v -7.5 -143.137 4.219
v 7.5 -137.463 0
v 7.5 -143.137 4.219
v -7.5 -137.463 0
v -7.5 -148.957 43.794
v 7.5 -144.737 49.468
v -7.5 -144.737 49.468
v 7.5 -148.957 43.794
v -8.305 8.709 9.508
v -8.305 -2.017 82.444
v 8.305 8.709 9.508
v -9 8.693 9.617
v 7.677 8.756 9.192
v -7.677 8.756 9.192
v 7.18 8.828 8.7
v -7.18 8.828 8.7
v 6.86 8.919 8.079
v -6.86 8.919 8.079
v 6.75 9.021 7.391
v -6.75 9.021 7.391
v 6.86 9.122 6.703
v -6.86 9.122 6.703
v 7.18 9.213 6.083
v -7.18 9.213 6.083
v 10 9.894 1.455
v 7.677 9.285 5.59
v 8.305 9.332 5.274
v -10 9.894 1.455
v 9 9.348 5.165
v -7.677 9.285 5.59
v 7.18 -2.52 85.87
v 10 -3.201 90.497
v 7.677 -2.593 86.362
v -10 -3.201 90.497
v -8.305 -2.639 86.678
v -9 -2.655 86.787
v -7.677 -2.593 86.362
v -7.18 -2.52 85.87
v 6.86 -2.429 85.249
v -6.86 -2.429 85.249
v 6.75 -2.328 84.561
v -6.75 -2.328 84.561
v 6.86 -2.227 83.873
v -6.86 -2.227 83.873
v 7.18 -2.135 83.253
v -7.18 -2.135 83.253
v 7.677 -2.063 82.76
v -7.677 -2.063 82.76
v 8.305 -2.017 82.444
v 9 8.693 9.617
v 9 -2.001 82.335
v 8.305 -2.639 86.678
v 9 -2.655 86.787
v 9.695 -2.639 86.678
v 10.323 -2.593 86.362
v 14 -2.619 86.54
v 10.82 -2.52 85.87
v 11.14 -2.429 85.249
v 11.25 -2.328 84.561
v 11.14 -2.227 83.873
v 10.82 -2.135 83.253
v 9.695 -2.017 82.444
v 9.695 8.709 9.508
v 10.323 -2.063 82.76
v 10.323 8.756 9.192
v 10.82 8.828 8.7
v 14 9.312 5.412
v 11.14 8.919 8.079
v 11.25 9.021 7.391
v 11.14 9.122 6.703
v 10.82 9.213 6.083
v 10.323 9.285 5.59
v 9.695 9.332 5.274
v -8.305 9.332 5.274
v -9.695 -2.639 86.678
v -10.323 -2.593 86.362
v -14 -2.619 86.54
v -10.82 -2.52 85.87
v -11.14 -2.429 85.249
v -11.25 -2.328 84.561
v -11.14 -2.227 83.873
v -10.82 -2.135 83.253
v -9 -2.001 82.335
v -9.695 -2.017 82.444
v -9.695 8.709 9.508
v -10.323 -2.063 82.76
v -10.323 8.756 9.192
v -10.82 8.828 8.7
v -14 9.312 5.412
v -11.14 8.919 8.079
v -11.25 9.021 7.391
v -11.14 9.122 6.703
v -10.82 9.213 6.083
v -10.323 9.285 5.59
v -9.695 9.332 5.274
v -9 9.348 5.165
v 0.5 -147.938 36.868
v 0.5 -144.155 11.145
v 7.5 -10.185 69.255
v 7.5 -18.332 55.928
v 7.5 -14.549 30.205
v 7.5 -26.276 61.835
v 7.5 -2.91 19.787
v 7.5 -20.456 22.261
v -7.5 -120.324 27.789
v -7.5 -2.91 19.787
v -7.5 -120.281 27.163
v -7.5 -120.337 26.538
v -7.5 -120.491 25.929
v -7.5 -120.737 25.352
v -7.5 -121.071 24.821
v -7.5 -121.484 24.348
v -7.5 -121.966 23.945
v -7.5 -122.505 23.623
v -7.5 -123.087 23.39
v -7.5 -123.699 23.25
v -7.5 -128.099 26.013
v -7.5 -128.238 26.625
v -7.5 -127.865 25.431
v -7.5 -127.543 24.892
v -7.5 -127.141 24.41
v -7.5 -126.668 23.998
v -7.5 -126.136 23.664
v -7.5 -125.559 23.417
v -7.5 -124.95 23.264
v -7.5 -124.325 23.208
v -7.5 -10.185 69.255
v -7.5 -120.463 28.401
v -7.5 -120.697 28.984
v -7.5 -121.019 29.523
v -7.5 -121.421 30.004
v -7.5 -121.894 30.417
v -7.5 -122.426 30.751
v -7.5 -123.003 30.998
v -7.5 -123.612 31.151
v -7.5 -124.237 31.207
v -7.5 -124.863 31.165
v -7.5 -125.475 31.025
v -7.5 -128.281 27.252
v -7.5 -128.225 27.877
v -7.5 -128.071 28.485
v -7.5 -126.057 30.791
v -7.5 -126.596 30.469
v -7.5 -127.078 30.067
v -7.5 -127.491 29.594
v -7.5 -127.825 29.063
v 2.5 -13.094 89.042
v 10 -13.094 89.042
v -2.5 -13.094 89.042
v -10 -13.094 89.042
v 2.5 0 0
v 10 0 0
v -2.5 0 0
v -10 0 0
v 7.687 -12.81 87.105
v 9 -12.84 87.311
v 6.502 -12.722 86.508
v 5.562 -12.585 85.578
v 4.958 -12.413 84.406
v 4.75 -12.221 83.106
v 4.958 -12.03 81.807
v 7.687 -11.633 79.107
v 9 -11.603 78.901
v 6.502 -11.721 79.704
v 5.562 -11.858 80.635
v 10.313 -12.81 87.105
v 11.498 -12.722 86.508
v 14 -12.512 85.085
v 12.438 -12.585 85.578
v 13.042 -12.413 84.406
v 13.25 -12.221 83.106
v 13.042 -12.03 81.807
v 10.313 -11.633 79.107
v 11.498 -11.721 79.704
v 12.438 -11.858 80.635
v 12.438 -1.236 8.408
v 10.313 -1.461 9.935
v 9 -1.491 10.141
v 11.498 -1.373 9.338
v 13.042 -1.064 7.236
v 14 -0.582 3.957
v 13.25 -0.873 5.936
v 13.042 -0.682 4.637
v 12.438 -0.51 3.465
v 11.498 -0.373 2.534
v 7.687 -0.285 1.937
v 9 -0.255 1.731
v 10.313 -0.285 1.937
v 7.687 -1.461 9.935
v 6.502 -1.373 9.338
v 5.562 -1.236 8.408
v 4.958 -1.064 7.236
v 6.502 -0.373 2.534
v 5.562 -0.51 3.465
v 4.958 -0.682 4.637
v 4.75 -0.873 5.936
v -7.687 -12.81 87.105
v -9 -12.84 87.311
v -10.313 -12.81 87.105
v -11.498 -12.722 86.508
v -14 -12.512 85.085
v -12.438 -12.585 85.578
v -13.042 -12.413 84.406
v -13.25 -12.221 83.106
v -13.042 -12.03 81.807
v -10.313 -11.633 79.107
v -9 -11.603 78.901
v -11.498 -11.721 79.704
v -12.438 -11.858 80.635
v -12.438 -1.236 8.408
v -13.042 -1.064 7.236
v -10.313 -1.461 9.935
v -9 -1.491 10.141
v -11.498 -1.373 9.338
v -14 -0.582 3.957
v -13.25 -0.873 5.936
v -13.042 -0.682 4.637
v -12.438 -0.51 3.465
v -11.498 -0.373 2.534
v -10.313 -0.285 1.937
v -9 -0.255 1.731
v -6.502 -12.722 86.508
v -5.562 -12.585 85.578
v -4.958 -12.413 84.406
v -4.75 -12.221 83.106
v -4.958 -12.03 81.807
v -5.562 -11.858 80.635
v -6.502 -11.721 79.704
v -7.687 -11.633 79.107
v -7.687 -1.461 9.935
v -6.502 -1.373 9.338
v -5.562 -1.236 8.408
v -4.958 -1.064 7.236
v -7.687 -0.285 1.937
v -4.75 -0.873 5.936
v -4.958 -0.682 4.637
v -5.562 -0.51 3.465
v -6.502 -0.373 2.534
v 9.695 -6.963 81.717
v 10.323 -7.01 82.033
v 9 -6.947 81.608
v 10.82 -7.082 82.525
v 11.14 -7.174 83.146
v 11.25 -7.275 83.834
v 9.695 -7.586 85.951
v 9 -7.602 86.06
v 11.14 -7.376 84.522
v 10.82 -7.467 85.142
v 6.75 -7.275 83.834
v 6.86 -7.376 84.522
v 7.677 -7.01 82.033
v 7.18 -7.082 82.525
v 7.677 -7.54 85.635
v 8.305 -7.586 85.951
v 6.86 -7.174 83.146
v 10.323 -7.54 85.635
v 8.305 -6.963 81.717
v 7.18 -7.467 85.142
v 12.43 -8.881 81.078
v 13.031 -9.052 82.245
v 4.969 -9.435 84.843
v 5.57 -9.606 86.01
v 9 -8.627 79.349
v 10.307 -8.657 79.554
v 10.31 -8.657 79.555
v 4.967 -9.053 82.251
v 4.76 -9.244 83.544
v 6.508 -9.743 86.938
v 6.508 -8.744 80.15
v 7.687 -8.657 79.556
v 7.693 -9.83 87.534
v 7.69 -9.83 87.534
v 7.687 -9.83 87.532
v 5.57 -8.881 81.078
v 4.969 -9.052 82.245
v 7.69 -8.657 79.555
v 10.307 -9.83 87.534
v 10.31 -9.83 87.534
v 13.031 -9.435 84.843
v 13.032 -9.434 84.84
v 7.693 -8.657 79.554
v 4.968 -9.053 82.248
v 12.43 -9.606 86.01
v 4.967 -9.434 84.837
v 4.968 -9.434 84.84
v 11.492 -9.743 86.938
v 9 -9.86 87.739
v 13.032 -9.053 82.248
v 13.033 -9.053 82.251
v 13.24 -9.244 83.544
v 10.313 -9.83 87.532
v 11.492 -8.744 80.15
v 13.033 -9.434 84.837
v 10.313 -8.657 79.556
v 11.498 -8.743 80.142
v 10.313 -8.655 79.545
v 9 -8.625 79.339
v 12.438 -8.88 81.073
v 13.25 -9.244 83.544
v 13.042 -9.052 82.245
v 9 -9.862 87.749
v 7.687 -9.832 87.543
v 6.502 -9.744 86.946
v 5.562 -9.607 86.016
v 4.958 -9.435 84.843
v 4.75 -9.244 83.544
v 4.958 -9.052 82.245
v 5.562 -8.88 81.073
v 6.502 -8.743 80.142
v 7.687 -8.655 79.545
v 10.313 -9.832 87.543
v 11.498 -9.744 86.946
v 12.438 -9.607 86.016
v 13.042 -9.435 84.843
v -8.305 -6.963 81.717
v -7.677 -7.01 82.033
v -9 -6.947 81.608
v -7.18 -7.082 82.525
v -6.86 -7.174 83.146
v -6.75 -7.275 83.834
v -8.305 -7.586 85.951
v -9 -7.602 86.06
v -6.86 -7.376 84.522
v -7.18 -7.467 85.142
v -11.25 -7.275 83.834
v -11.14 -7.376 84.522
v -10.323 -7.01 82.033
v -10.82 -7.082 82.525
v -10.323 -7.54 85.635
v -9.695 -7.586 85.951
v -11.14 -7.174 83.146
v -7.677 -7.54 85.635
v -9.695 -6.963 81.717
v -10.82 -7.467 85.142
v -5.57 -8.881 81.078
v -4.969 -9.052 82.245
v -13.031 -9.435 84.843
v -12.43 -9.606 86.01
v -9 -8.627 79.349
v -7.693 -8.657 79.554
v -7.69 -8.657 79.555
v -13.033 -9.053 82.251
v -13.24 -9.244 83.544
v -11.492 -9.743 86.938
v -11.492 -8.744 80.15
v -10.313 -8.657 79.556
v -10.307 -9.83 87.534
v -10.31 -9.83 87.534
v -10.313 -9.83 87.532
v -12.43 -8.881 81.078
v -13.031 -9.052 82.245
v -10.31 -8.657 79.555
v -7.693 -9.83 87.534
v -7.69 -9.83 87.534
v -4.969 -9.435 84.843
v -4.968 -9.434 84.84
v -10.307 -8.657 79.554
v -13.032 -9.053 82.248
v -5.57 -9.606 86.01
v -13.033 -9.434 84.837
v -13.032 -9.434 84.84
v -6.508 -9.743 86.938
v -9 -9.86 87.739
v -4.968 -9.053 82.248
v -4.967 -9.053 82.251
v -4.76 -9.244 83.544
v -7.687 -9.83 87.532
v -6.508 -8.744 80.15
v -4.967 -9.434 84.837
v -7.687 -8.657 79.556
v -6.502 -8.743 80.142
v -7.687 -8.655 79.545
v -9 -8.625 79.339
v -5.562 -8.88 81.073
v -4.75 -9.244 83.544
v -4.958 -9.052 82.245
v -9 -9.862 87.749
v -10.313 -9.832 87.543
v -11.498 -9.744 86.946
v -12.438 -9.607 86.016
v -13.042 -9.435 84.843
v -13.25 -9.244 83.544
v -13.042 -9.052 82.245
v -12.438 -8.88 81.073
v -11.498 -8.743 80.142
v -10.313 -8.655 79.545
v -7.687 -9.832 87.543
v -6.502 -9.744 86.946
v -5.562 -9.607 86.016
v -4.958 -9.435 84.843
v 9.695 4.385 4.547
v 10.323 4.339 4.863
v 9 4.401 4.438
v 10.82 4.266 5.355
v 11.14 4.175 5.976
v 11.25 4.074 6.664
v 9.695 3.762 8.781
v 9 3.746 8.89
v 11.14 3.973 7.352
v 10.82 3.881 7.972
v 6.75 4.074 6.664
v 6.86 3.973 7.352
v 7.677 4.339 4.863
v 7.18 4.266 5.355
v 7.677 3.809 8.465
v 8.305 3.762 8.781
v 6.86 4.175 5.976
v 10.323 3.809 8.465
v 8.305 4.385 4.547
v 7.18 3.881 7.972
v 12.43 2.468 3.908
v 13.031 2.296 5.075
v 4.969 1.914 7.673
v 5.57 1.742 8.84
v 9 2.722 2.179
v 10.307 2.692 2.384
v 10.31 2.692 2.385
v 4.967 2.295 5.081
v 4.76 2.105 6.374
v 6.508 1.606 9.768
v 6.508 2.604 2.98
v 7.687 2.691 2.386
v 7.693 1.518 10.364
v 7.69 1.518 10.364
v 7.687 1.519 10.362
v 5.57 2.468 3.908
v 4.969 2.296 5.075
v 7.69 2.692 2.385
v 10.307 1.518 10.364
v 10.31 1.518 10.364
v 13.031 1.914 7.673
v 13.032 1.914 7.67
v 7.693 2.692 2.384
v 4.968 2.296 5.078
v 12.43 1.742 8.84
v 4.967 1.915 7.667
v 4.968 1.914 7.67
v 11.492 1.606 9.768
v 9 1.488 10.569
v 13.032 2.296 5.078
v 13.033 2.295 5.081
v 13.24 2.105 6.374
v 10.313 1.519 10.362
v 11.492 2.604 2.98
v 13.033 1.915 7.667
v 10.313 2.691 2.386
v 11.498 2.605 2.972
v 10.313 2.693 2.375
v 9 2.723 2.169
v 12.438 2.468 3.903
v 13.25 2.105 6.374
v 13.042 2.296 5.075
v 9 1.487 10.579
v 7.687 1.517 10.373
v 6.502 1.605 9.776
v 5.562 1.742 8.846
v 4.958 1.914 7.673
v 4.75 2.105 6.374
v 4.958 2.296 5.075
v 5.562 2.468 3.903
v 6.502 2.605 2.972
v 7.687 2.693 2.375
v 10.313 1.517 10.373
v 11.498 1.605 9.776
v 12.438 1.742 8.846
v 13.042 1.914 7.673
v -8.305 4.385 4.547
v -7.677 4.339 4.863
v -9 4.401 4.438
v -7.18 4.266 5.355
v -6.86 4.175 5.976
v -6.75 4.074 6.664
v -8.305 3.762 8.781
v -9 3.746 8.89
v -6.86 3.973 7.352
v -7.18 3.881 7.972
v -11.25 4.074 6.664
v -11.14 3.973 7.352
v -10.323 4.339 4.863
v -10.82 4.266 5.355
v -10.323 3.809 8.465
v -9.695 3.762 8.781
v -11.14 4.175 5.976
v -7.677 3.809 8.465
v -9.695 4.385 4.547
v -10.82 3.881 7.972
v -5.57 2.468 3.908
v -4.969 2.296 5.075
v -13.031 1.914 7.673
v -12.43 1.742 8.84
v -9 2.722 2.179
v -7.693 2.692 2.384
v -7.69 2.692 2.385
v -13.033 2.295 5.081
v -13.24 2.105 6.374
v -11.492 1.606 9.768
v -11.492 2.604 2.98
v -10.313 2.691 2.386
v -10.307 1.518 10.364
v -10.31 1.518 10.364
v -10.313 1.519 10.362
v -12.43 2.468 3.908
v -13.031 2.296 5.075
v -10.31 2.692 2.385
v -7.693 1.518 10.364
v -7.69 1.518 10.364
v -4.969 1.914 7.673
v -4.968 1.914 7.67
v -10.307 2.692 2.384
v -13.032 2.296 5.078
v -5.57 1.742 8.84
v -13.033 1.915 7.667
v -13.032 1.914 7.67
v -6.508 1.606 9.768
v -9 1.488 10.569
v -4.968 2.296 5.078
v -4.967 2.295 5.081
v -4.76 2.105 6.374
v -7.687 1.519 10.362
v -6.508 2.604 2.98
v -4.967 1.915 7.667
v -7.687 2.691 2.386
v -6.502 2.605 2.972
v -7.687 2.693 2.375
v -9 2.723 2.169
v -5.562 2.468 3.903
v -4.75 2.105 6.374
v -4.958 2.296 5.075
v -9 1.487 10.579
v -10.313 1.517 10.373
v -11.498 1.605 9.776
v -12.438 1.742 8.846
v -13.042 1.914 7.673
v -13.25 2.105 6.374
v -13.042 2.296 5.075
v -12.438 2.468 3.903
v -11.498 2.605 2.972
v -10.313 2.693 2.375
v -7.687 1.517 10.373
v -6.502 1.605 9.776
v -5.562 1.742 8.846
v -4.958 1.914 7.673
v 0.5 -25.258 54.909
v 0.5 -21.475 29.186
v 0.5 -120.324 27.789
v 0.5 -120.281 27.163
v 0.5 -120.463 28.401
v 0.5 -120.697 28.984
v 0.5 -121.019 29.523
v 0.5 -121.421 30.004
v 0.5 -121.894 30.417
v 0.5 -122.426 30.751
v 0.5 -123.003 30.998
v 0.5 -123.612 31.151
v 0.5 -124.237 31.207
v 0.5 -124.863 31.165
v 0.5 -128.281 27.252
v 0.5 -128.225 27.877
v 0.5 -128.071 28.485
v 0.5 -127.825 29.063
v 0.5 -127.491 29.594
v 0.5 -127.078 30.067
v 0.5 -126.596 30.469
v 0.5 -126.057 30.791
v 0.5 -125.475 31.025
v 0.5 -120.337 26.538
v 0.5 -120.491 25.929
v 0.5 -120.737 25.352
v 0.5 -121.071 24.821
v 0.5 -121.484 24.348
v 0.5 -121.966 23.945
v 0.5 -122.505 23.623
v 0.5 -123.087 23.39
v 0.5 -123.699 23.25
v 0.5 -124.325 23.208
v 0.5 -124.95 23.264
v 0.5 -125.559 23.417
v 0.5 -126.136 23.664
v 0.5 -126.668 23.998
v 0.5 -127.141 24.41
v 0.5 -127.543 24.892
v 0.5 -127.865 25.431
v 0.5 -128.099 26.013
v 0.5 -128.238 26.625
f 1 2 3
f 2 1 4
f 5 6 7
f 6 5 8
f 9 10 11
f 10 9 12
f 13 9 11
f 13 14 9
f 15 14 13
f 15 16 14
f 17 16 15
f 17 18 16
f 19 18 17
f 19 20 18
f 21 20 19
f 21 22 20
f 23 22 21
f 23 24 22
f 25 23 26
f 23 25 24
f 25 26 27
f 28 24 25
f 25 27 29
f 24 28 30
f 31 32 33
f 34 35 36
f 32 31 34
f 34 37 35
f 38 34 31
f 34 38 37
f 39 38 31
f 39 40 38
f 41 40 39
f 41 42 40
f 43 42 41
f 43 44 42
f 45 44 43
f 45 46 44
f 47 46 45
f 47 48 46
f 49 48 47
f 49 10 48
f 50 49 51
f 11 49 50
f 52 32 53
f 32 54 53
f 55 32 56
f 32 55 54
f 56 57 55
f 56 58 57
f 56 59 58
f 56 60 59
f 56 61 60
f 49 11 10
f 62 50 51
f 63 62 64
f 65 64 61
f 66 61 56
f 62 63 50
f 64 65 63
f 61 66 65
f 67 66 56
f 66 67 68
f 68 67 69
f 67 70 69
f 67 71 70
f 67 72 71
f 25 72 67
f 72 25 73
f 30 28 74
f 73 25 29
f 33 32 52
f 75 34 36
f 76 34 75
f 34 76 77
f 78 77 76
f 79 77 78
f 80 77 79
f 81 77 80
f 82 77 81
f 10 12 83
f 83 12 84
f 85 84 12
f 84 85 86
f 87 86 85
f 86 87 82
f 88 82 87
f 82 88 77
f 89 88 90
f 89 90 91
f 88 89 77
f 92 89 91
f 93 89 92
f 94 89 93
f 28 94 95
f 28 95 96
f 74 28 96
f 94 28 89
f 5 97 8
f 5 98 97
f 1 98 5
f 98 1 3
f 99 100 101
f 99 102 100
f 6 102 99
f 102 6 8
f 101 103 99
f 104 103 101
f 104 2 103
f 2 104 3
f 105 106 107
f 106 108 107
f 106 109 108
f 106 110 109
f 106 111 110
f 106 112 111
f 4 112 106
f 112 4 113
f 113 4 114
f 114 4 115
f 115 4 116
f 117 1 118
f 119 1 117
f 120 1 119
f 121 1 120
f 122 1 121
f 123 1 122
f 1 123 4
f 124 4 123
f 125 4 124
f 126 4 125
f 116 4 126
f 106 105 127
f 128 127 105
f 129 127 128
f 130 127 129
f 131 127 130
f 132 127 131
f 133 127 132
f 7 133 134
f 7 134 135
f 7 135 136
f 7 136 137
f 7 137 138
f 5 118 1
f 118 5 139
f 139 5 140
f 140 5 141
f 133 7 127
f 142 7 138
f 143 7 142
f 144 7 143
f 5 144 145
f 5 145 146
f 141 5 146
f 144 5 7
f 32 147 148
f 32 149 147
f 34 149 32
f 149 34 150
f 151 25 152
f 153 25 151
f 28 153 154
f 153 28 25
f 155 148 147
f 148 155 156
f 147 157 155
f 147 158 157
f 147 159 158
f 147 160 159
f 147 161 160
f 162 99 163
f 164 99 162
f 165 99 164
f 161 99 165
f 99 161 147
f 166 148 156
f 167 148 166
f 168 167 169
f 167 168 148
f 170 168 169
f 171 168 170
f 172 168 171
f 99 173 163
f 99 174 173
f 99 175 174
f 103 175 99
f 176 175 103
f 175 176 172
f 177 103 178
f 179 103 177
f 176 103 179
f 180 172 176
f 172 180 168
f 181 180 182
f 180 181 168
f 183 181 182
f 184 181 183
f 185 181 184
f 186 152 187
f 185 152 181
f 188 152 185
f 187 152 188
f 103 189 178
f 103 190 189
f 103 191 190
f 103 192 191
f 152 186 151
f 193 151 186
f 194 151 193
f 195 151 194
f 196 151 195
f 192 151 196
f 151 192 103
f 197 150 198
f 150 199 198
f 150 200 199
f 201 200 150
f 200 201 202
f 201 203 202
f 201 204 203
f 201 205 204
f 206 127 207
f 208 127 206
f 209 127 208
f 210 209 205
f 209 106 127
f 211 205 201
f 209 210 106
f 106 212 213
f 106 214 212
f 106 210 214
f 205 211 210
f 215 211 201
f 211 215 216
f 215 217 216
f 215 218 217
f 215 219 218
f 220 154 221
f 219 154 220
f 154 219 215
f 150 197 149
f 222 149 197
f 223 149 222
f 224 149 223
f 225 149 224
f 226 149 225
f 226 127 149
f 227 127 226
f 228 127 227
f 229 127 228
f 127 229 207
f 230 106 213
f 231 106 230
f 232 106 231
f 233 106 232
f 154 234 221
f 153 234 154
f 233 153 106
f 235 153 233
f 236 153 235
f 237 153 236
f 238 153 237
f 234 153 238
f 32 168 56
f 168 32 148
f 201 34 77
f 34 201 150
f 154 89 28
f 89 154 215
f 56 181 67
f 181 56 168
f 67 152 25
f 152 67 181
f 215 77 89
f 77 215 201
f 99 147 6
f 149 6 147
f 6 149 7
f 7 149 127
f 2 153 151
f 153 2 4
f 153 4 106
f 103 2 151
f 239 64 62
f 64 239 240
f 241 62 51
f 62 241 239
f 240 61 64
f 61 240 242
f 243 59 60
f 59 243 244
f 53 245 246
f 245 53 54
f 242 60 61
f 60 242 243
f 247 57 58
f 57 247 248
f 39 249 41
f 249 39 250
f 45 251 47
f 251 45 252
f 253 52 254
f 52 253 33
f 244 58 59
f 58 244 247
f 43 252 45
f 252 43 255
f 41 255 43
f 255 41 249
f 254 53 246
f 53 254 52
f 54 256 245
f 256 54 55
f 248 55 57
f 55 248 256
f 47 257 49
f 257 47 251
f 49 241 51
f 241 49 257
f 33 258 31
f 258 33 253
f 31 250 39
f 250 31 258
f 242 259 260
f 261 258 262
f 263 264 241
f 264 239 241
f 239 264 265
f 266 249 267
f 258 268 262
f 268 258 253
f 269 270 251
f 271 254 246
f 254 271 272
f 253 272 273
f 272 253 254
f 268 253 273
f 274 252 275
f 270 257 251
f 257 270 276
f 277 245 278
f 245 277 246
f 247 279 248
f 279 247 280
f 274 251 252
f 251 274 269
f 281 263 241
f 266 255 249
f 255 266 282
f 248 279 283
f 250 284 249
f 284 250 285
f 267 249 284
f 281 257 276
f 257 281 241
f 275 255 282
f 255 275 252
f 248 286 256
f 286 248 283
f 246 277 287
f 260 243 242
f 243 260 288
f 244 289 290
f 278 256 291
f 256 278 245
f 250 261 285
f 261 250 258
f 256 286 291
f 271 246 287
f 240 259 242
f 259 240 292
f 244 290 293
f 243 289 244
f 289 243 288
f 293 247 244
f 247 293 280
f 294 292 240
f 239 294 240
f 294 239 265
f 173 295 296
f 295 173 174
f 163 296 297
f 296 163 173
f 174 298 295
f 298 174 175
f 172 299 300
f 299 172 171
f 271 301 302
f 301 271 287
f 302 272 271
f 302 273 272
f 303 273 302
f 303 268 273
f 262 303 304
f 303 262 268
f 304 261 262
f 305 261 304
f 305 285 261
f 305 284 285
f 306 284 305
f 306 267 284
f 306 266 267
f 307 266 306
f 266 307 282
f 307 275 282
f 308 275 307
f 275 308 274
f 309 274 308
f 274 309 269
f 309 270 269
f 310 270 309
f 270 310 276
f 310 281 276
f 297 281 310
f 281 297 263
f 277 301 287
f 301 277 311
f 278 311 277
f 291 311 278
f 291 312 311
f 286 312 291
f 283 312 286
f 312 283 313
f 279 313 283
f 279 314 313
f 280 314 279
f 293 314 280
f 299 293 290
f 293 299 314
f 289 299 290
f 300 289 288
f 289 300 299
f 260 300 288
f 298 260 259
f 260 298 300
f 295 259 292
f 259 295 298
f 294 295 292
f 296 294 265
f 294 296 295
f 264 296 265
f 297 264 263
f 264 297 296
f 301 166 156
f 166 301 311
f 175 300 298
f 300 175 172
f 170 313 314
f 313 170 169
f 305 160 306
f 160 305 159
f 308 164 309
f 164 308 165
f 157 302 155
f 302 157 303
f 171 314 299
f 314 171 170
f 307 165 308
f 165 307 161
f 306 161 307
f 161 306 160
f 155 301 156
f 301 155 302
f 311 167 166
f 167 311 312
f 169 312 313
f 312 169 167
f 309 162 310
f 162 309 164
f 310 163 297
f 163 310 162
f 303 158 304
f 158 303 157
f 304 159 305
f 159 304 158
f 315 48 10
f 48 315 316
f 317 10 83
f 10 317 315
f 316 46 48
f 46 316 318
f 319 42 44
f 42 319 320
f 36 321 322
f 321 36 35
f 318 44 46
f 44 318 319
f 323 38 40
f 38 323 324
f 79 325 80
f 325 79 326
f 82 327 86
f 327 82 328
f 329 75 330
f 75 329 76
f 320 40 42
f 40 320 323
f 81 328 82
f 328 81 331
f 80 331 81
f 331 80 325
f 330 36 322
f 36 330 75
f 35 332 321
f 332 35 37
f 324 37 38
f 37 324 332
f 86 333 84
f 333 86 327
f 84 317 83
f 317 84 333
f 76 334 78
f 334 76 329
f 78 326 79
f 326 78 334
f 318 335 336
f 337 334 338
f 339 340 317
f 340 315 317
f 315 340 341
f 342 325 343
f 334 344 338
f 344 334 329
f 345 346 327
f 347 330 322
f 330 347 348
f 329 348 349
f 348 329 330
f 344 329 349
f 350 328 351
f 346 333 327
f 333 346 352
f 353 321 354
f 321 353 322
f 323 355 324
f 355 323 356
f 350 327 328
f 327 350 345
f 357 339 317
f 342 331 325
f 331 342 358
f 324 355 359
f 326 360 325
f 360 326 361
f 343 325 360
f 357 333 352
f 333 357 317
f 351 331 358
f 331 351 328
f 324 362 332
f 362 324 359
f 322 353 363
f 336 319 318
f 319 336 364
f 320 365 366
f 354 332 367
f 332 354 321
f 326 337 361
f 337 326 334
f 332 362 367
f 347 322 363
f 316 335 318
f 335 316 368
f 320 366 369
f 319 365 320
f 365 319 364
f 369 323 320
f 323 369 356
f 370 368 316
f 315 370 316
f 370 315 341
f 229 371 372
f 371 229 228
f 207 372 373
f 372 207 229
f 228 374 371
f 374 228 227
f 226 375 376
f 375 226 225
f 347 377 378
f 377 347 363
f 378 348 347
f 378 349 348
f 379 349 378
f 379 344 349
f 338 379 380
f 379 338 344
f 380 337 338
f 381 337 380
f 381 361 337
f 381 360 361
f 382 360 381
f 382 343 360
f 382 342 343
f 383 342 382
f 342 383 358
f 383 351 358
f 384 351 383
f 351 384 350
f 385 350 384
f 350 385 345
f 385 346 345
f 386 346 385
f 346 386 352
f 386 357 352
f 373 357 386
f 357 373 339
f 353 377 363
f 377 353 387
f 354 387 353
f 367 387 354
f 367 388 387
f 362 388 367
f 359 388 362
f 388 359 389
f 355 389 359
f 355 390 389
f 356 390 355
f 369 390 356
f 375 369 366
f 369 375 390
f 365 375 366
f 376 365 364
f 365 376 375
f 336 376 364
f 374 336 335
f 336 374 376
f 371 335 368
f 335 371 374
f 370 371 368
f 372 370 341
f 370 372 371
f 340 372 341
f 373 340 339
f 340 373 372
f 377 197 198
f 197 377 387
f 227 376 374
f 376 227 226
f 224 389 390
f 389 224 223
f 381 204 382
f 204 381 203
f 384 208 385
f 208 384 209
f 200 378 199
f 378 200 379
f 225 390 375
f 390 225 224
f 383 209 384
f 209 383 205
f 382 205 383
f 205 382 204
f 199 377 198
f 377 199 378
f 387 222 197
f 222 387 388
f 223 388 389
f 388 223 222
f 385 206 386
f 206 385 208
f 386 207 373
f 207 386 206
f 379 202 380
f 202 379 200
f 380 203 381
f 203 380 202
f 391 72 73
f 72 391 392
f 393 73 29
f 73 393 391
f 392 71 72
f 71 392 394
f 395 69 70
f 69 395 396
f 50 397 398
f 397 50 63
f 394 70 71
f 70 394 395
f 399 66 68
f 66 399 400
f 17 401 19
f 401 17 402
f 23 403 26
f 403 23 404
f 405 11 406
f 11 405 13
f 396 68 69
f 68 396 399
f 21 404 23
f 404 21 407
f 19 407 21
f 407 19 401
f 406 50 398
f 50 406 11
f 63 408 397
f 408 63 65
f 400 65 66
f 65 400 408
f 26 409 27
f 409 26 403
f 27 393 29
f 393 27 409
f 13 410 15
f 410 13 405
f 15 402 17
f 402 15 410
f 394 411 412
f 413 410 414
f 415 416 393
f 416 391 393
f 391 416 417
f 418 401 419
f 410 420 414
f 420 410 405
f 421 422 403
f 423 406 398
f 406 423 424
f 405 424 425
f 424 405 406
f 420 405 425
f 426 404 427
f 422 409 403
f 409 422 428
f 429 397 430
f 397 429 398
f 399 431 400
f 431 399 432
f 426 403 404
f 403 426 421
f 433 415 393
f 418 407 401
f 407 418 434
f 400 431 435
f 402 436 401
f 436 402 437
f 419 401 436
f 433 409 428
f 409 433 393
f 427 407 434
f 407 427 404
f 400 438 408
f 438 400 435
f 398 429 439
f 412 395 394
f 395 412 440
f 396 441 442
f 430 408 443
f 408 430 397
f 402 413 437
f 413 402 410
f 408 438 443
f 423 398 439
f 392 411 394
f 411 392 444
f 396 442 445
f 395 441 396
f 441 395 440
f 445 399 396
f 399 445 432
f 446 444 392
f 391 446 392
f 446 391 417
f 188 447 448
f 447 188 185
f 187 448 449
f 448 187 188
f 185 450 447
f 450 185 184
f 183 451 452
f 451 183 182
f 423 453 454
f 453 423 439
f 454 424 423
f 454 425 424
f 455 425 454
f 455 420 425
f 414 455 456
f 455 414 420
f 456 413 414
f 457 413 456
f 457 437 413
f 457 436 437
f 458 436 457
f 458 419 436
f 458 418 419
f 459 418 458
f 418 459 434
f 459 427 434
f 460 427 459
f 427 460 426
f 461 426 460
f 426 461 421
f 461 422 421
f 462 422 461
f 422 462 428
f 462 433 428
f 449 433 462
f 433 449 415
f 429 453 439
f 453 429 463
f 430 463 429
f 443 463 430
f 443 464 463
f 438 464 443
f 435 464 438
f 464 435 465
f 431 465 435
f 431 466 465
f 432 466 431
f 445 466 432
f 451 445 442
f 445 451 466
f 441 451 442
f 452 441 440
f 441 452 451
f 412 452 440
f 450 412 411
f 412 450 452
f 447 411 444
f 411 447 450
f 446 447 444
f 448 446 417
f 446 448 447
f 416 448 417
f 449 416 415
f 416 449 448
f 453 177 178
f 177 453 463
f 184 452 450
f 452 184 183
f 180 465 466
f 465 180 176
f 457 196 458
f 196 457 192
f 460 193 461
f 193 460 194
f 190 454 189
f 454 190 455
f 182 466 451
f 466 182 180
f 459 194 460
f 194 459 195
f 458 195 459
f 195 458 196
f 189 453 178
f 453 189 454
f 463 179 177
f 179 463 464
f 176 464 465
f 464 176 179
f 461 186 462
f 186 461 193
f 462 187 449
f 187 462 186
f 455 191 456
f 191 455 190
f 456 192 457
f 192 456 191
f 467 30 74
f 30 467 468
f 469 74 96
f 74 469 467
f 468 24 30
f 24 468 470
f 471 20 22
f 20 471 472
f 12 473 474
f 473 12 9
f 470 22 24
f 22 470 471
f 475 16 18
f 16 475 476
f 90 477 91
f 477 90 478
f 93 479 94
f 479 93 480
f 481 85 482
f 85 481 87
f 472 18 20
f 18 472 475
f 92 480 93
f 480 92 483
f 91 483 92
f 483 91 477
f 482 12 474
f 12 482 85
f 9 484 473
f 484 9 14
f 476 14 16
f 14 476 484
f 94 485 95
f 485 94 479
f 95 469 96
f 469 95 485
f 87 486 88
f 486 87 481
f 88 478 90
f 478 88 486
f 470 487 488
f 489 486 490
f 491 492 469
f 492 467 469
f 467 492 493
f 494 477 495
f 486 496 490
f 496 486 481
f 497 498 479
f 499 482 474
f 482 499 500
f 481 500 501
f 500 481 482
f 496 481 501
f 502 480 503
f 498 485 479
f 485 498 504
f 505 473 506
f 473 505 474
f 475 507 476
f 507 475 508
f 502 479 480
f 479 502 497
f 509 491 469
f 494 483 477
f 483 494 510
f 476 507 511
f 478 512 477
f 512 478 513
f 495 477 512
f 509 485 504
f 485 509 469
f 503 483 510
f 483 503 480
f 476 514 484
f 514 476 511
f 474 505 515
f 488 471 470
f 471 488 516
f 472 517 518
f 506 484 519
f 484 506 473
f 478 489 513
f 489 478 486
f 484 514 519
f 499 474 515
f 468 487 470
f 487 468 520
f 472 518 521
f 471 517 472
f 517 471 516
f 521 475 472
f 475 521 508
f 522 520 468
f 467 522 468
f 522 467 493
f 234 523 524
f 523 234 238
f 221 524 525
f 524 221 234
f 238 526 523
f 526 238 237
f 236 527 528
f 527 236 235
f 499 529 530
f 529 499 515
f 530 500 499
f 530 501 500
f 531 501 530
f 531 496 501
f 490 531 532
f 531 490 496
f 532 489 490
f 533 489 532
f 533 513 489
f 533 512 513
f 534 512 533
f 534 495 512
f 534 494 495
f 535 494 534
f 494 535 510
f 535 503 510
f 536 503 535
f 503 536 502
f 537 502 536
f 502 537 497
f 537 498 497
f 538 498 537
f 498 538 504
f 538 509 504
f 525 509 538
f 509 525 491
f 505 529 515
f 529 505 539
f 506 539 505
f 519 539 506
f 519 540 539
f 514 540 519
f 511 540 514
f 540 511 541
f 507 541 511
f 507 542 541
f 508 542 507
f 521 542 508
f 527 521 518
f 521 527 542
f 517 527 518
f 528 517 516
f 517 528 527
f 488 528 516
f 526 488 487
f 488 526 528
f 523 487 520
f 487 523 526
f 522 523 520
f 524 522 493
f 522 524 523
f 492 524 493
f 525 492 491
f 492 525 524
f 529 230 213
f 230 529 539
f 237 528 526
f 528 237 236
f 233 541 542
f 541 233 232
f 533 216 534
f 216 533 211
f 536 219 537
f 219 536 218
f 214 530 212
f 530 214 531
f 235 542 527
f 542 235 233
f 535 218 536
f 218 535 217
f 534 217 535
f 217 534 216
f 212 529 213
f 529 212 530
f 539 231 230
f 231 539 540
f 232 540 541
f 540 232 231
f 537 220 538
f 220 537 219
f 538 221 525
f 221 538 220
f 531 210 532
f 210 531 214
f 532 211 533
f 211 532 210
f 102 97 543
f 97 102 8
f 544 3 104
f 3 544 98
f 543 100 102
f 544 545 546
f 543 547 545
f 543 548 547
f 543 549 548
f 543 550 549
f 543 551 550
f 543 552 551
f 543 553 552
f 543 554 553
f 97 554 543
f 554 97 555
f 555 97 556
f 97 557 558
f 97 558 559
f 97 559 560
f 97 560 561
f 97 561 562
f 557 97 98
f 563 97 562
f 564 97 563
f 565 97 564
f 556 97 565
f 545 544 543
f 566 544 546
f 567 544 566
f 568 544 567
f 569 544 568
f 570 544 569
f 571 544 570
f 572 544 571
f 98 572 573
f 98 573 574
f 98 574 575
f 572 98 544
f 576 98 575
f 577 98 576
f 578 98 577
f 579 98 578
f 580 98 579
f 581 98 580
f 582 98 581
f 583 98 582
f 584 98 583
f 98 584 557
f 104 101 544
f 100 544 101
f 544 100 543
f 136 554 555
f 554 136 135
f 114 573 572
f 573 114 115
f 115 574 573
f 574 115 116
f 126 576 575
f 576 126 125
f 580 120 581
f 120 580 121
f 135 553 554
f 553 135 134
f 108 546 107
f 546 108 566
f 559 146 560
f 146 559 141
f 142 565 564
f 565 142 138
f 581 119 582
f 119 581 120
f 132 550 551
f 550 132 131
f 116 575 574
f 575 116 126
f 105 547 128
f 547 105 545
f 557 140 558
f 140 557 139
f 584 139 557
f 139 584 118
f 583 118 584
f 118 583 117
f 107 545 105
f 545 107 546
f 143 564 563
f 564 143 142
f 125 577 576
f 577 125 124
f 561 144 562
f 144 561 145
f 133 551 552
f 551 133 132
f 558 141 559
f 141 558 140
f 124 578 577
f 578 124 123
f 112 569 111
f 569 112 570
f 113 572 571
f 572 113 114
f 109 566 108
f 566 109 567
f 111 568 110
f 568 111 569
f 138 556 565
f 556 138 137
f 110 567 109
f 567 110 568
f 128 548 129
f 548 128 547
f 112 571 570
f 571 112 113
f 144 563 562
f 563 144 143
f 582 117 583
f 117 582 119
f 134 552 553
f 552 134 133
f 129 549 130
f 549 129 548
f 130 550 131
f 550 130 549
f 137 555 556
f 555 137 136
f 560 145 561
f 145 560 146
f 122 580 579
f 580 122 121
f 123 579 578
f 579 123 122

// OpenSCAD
// file: ../Dollo/NEW_long_ties/globals.scad
/*
Most things in this file is represented as one millimeter, so keep that in mind while changing things.
Some of the setting are not mm but at variables that you can set, such as 2*x=2x and you are setting what x is.
I will try to specify when things are variables and not exact measurements.
*/

// printer slop
slop = 0.15;

obj_leg = 30;
leg_length = 5.5;
small_number = 0.001;
metal_core_rode_global = 5;


///////////////// number of holes /////////////////////
z_hole_number = 8;
other_holes = 8;

///////////////// Pins /////////////////////

//pins that poke out
ball_size = 10;
pin_height = 20;
pin_diameter = 6;


//holes
hole_ball_size = ball_size;
hole_pin_height = pin_height;
hole_pin_diameter = pin_diameter;

///////////////// Z THINGS /////////////////////

berring_slot_width = 7.5;
berring_slot_depth = 6.5;
metal_core_rode = 5;

///////////////// X THINGS /////////////////////

//male dove tails
male_dove_max_width=8;
male_dove_min_width=5;
male_dove_depth=5;
male_dove_height=obj_leg/2;

function scaled_male_dove_max_width() = male_dove_max_width - slop;
function scaled_male_dove_min_width() = male_dove_min_width - slop;
function scaled_male_dove_depth() = male_dove_depth - slop;

//female dove tails, this is found on the y mounts
girl_max_width=11;
girl_min_width=5;
girl_depth=5;
girl_height=obj_leg;


///////////////// Y THINGS /////////////////////
/*
The Y is so normal that all of those global variables at the top should change all of the setting in it, this section is set her incase there are variables set in the future development of this project.
*/

// stepper
motor_side_length = 43.2;
motor_bolt_hole_distance = 31;
motor_center_hole = 23;
motor_shaft_dia = 5;
motor_shaft_hole_dia = 5+2*slop;

// bolts etc.
bolt_hole_dia = 3+2*slop;
bolt_head_hole_dia = 5.8;

m4_bolt_hole_dia = 4+2*slop;
m4_bolt_head_hole_dia = 6.8+2*slop;


m3_nut_side = 5.65;
m3_nut_height = 2.3;
m4_nut_side = 6.85;
m4_nut_height = 3.1;

// threaded rod
lifter_rod_diam = 9.86;
hole_threaded_rod = lifter_rod_diam+2*slop;

// for the extensions
metal_rod_size = 9;
// main file
use <../Dollo/NEW_long_ties/include.scad>;


w = 110;
h = 60;

//debug();
//debug_table_to_table_bracket();
//debug_table_wall_bracket_2();

//table_wall_bracket();
table_wall_bracket_2();
//table_bracket();
//knob();
//table_to_table_bracket();

module screw_hole() {
    rotate([-90, 0, 0]) {
        cylinder(d=4.5, h=100, center=true, $fn=20);
        cylinder(d1=10, d2=24, h=50,
            center=true, $fn=20);
    }
    
}

module screw_hole_2() {
    union() {
        cylinder(d=4.5, h=100, center=true, $fn=20);

        cylinder(d1=4.5, d2=8.5, h=2, $fn=20);

        translate([0, 0, 1.99])
        cylinder(d=8.5, h=12, $fn=20);
    }
}

module _table_wall_bracket() {
    difference() {
        cube([w, w, h], center=true);

        hull() {
            cylinder(d=w/2, h=80, center=true, $fn=80);

            translate([w/4, w, 0])
            cube([w, w, h + 10], center=true);

            translate([w, w/2 - w/2.5, 0])
            cube([w, w, h + 10], center=true);
        }

        // positioning hole
        translate([-w/2 - 3, 20, 0])
        chamfered_cube(20, w, h/1.5, 7, center=true);

        // chamfers
        translate([w/2, 0, h/2])
        rotate([0, 45, 0])
        cube([10, 200, 10], center=true);

        translate([w/2, 0, -h/2])
        rotate([0, 45, 0])
        cube([10, 200, 10], center=true);

        translate([0, w/2, h/2])
        rotate([45, 0, 0])
        cube([200, 10, 10], center=true);

        translate([0, w/2, -h/2])
        rotate([45, 0, 0])
        cube([200, 10, 10], center=true);

        translate([-w/2, -w/2, 0])
        rotate([0, 0, 45])
        cube([15, 15, h + 10], center=true);

        // screw holes
        translate([w/2 - 10, -w/2 + 50/2 + 7, -h/2 + 10])
        screw_hole();

        translate([w/2 - 10, -w/2 + 50/2 + 7, h/2 - 10])
        screw_hole();

        translate([-10, -w/2 + 50/2 + 7, -h/2 + 10])
        screw_hole();

        translate([-10, -w/2 + 50/2 + 7, h/2 - 10])
        screw_hole();

        translate([-w/2, 12, 0])
        hull() {
            rotate([45, 0, 0])
            cube([70, 7, 7], center=true);

            translate([0, w/5, 0])
            rotate([45, 0, 0])
            cube([70, 7, 7], center=true);
        }
    }
}

module table_wall_bracket() {
    difference() {
        rotate([90, 0, 0])
        _table_wall_bracket();

        // infill
        translate([-w/2 + 10, -h/2 + 10, 0])
        cube([0.1, 2, w * 2], center=true);

        translate([-w/2 + 10, h/2 - 10, 0])
        cube([0.1, 2, w * 2], center=true);

        translate([-w/2 + 17, -h/2 + 19, 0])
        cube([0.1, 2, w * 2], center=true);

        translate([-w/2 + 17, h/2 - 19, 0])
        cube([0.1, 2, w * 2], center=true);
    }
}

module table_bracket() {
    difference() {
        union() {
            chamfered_cube_side(
                h, 90, 10, 5, center=true);

            translate([0, 0, 10/2 - 0.6])
            chamfered_cube(
                h/1.5, 90, 15, 7, center=true);
        }

        translate([0, 2, -10/2 - 1]) {
            M5_nut(10, cone=false, bridging=true);

            cylinder(d=5.5, h=40, center=true, $fn=30);
        }

        translate([h/2 - 6, 90/2 - 15, 1.01])
        screw_hole_2();

        translate([-h/2 + 6, 90/2 - 15, 1.01])
        screw_hole_2();

        translate([h/2 - 6, -90/2 + 15, 1.01])
        screw_hole_2();

        translate([-h/2 + 6, -90/2 + 15, 1.01])
        screw_hole_2();
    }
}

module knob() {

    ridges = 25;
    
    difference() {
        union() {
            translate([0, 0, 2.32])
            rounded_cylinder(35, 18, 4, $fn=80);

            cylinder(d1=35 - 6 - 1, d2=35 - 1, h=3, $fn=80);
        }

        for(i = [1:ridges]) {
            rotate([0, 0, i * 360/ridges])
            translate([35/2, 0, 0])
            cylinder(d=3, h=50, $fn=30);
        }

        translate([0, 0, 14])
        M5_nut(10);

        cylinder(d=5.4, h=40, center=true, $fn=20);
    }
}

module table_to_table_bracket() {
    rotate([0, 90, 0])
    difference() {
        chamfered_cube_side(60, 140, 35, 5, center=true);

        translate([0, 140/2 - (60 - 65/2), 35/2 - (22 - 30/2)])
        cube([70, 65, 30], center=true);

        // positioning hole
        translate([0, 0, 35/2 + 1/2])
        chamfered_cube(h/1.5, 200, 15, 7, center=true);

        translate([0, -100/2 - 5, -35/2 - 10])
        chamfered_cube(200, 125, 50, 20, center=true);

        translate([0, -37, 0])
        cylinder(d=8, h=100, center=true, $fn=40);

        #translate([-60/2 + 10, 140/2 - 10, -35/2 - 25 + 6])
        rotate([-90, 0, 0])
        screw_hole();

        #translate([60/2 - 10, 140/2 - 10, -35/2 - 25 + 6])
        rotate([-90, 0, 0])
        screw_hole();

        #translate([-60/2 + 10, 140/2 - 50, -35/2 - 25 + 6])
        rotate([-90, 0, 0])
        screw_hole();

        #translate([60/2 - 10, 140/2 - 50, -35/2 - 25 + 6])
        rotate([-90, 0, 0])
        screw_hole();

        translate([0, -140/2, -15])
        rotate([45, 0, 0])
        cube([70, 30, 30], center=true);

        // infill
        translate([0, 2, -8])
        rotate([45, 0, 0])
        cube([70, 4, 0.1], center=true);

        translate([0, 1, -1])
        rotate([45, 0, 0])
        cube([70, 4, 0.1], center=true);

        translate([0, 0, 6])
        rotate([45, 0, 0])
        cube([70, 4, 0.1], center=true);

        translate([0, 30, -11])
        rotate([45, 0, 0])
        cube([70, 4, 0.1], center=true);

        translate([0, 50, -11])
        rotate([45, 0, 0])
        cube([70, 4, 0.1], center=true);

        translate([0, -20, 4])
        rotate([45, 0, 0])
        cube([70, 4, 0.1], center=true);

        translate([0, -50, 4])
        rotate([45, 0, 0])
        cube([70, 4, 0.1], center=true);

    }
}

module table_wall_bracket_2() {
    l = 86 + 65;

    angle = atan(20/(l - 15));

    rotate([angle, 0, 0])
    translate([0, -l/2 + 10, 90/2])
    rotate([0, 90, 0])
    difference() {
        union() {
            chamfered_cube_side(50, l, 15, 5, center=true);

            translate([0, l/2 - 10/2, 0])
            rotate([90, 0, 0])
            chamfered_cube_side(90, 28, 10, 4, center=true);

            hull() {
                translate([-90/2 + 1/2, l/2 - 10 + 1/2, 0])
                cube([1, 1, 5], center=true);

                translate([-50/2 + 1/2, 0, 0])
                cube([1, l - 10, 15], center=true);
            }

            mirror([1, 0, 0])
            hull() {
                translate([-90/2 + 1/2, l/2 - 10 + 1/2, 0])
                cube([1, 1, 5], center=true);

                translate([-50/2 + 1/2, 0, 0])
                cube([1, l - 10, 15], center=true);
            }
        }

        // positioning hole
        translate([0, -20, 15/2 + 1/2])
        chamfered_cube(h/1.5, l, 15, 7, center=true);

        // screw holes
        translate([-90/2 + 6, l/2 - 5, 9])
        rotate([90, 0, 0])
        screw_hole_2();

        translate([-90/2 + 6, l/2 - 5, -9])
        rotate([90, 0, 0])
        screw_hole_2();

        translate([90/2 - 6, l/2 - 5, 9])
        rotate([90, 0, 0])
        screw_hole_2();

        translate([90/2 - 6, l/2 - 5, -9])
        rotate([90, 0, 0])
        screw_hole_2();

        translate([0, l/2 - 90/2 - 86 + 2, 0])
        cylinder(d=8, h=100, center=true, $fn=40);
    }
}

module debug() {
    intersection() {
        table_wall_bracket();

        translate([0, 0, -10])
        cube([200, 200, 40], center=true);
    }

    translate([-w/2 - 10/2 - 0.1, 10, 0])
    rotate([0, 90, 0])
    table_bracket();
}

module debug_table_to_table_bracket() {
    //%translate([-200/2, 0, 18/2])
    //cube([200, 200, 18], center=true);

    %translate([200/2, 0, 50/2])
    cube([200, 200, 50], center=true);

    translate([-90/2, 0, 18 + 10/2])
    rotate([0, 0, 90])
    table_bracket();

    translate([-10, 0, 35/2 + 50 - 22])
    rotate([180, 0, 90])
    table_to_table_bracket();

    translate([-47, 0, 48])
    knob();

    #translate([-47, 0, 44])
    cylinder(d=5, h=44, center=true);
}

module debug_table_wall_bracket_2() {
    l = 86 + 65;

    //%translate([0, l/2 - 100/2 - 86, 15/2 + 10 + 50/2])
    //cube([100, 100, 50], center=true);

    angle = atan(20/(l - 15));
    
    
    rotate([0, -90, 0])
    translate([0, l/2 - 10, -90/2])
    rotate([-angle, 0, 0])
    table_wall_bracket_2();

    translate([0, l/2 - 90/2 - 86, 15/2 + 10/2])
    rotate([0, 180, 0])
    table_bracket();

    translate([0, l/2 - 90/2 - 86 + 2, -7.5])
    rotate([0, 180, 0])
    knob();

    #translate([0, l/2 - 90/2 - 86 + 2, -25])
    cylinder(d=5, h=40);
}
